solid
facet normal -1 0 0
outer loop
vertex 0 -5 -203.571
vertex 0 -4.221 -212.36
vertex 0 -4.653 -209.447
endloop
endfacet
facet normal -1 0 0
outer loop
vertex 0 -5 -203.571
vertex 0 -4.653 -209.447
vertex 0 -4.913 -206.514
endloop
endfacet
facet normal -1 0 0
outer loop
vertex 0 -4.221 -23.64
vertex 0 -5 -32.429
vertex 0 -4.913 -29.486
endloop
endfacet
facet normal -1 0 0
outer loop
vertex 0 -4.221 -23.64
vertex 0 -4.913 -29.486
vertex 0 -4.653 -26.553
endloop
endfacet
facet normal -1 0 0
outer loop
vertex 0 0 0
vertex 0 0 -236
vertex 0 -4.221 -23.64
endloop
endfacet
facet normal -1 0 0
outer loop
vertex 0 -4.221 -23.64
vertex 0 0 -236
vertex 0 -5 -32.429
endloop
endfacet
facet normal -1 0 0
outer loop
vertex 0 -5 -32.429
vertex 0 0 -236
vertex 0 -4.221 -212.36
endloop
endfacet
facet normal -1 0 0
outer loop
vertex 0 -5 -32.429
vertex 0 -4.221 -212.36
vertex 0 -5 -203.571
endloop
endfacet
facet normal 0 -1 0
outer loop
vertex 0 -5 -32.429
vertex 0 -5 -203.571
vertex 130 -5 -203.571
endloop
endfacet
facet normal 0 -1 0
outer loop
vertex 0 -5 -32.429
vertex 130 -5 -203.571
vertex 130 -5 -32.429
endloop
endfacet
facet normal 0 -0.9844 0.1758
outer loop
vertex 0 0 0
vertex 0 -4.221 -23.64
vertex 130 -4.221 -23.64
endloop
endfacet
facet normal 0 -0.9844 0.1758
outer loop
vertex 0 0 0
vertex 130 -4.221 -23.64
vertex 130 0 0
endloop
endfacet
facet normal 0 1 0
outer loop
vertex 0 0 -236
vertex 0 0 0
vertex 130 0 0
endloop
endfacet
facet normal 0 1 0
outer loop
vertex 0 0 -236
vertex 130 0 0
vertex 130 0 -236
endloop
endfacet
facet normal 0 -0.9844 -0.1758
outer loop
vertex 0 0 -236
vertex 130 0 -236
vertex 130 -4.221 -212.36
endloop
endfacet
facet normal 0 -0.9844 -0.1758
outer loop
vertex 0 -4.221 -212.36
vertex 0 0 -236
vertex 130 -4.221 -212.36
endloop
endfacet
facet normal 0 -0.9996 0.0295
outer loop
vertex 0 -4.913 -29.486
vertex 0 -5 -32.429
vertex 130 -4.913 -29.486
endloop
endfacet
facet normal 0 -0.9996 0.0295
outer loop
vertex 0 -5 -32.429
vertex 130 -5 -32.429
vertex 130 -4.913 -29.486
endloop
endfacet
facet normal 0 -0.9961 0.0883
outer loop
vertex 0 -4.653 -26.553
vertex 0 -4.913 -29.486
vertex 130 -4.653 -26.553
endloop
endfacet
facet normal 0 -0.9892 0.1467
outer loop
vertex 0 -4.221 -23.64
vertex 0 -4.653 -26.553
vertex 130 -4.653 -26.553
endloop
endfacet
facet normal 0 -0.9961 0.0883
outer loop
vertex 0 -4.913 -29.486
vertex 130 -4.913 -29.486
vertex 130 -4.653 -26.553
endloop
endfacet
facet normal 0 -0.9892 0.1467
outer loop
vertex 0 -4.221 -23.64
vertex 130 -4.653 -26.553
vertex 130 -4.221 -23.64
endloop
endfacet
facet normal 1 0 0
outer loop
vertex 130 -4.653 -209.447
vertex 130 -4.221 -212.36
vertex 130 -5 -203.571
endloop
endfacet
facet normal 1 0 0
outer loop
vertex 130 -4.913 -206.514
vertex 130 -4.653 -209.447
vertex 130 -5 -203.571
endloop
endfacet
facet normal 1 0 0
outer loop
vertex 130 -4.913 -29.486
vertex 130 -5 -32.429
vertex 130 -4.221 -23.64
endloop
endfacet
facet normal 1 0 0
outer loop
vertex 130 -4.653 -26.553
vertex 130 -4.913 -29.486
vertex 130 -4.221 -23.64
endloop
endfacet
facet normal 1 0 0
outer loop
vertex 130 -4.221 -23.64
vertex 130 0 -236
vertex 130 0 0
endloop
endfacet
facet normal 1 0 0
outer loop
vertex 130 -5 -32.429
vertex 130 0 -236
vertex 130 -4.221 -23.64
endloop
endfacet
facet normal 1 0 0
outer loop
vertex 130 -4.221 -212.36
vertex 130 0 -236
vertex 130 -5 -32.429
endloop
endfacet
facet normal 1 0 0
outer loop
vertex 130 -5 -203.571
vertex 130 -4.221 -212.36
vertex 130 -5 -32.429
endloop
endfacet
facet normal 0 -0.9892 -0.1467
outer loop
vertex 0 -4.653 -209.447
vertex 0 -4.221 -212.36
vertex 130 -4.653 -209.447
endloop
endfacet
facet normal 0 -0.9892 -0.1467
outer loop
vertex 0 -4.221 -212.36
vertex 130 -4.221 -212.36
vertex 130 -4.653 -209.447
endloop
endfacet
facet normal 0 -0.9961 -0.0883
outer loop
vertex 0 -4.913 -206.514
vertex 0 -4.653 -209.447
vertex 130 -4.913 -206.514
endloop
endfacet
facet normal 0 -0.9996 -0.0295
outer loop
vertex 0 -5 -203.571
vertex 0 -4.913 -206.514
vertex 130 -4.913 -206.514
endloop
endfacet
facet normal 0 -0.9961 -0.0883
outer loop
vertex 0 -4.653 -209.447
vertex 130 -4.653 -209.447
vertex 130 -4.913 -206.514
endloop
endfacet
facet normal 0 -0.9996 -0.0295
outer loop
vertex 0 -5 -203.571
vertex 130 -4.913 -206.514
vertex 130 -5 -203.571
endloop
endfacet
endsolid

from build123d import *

# Parameters (mm, degrees)
BOSS_EXTRUDE1_DEPTH = 130
FILLET1_R           = 50


with BuildPart() as part:
    # Sketch1 → Boss-Extrude1 (new body)
    with BuildSketch(Plane(origin=(0, 0, 0), x_dir=(0, 0, -1), z_dir=(1, 0, 0))):
        Polygon((0, 0), (236, 0), (208, -5), (28, -5), align=None)
    extrude(amount=BOSS_EXTRUDE1_DEPTH)

    # Fillet1
    fillet1_edges = [part.edges().sort_by_distance(p)[0] for p in [
        (65, -5, -208),
        (65, -5, -28),
    ]]
    fillet(fillet1_edges, radius=FILLET1_R)


solid = part.part
